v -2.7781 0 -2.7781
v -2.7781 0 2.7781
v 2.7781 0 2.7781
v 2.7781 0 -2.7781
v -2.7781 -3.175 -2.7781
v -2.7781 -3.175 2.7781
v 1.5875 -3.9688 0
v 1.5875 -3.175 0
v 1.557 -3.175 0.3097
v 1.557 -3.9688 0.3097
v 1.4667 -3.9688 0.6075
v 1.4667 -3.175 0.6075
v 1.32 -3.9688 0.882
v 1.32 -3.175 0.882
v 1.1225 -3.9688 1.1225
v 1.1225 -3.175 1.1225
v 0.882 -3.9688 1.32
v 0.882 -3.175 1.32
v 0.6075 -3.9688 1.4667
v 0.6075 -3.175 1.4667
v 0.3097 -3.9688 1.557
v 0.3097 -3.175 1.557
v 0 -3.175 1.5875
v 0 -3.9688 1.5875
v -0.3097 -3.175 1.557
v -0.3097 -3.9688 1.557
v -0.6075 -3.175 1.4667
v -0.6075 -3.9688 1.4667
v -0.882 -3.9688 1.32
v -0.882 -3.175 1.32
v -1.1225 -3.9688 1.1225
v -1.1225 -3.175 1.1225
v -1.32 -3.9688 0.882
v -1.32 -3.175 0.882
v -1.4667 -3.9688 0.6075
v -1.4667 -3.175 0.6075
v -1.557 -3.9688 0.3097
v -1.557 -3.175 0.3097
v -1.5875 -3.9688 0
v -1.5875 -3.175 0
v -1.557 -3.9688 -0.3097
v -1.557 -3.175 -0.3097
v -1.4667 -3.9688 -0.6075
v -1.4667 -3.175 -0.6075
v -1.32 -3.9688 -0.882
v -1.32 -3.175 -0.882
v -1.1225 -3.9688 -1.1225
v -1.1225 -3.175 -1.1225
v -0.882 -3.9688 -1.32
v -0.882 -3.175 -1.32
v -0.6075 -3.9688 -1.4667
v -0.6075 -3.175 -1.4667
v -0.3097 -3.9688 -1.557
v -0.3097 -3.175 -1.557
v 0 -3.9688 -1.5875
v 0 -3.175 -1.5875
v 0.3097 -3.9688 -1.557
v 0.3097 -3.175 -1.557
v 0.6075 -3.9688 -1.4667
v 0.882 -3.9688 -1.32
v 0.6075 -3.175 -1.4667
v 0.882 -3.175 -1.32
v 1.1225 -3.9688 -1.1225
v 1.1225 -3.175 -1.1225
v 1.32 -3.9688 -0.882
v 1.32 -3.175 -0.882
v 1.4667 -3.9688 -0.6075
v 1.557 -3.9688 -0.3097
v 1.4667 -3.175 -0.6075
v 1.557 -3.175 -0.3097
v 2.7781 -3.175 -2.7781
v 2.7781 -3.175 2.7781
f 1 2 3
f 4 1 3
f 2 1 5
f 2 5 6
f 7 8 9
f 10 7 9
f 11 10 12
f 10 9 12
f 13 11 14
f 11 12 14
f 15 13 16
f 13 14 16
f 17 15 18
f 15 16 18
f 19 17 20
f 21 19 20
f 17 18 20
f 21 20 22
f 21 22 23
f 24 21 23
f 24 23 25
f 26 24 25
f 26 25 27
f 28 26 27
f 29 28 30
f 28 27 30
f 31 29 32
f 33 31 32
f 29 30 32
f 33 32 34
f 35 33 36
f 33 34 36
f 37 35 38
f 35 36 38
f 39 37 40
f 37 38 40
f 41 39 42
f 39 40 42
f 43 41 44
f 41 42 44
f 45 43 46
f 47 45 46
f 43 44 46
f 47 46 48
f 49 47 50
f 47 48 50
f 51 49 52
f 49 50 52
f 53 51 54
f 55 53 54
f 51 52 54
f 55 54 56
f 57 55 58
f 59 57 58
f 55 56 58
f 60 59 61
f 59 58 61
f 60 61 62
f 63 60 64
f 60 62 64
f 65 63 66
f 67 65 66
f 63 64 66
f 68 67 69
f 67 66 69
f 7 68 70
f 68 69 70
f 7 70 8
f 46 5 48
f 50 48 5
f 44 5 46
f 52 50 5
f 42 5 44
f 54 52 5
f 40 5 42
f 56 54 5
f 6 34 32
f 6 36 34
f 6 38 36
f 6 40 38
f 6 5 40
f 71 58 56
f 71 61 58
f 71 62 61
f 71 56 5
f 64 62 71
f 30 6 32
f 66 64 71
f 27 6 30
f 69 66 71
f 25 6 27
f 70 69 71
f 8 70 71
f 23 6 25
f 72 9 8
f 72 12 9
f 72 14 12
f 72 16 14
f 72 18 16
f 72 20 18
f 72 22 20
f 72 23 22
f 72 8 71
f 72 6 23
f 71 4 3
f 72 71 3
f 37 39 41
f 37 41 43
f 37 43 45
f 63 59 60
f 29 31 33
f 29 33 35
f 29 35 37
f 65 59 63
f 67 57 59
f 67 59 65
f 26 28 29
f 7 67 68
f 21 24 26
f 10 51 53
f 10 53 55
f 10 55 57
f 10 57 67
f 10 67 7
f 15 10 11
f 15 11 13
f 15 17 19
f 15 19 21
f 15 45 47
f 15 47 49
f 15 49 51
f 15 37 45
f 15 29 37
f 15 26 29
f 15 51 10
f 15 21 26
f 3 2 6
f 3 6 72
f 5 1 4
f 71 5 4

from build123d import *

# Parameters (mm, degrees)
F0_W     = 5.55625
F0_H     = 5.55625
F0_R     = 1.5875
F1_DEPTH = 3.175
F2_R     = 1.5875
F3_DEPTH = 0.79375


with BuildPart() as f1:
    # F0 (on Front) → F1 (new body)
    with BuildSketch(Plane.XZ):
        Rectangle(F0_W, F0_H)
        Circle(F0_R, mode=Mode.SUBTRACT)
        Circle(F0_R)
    extrude(amount=F1_DEPTH)

    # F2 (on face) → F3 (join)
    with BuildSketch(Plane.XZ.offset(3.175)):
        Circle(F2_R)
    extrude(amount=F3_DEPTH)


solid = f1.part
